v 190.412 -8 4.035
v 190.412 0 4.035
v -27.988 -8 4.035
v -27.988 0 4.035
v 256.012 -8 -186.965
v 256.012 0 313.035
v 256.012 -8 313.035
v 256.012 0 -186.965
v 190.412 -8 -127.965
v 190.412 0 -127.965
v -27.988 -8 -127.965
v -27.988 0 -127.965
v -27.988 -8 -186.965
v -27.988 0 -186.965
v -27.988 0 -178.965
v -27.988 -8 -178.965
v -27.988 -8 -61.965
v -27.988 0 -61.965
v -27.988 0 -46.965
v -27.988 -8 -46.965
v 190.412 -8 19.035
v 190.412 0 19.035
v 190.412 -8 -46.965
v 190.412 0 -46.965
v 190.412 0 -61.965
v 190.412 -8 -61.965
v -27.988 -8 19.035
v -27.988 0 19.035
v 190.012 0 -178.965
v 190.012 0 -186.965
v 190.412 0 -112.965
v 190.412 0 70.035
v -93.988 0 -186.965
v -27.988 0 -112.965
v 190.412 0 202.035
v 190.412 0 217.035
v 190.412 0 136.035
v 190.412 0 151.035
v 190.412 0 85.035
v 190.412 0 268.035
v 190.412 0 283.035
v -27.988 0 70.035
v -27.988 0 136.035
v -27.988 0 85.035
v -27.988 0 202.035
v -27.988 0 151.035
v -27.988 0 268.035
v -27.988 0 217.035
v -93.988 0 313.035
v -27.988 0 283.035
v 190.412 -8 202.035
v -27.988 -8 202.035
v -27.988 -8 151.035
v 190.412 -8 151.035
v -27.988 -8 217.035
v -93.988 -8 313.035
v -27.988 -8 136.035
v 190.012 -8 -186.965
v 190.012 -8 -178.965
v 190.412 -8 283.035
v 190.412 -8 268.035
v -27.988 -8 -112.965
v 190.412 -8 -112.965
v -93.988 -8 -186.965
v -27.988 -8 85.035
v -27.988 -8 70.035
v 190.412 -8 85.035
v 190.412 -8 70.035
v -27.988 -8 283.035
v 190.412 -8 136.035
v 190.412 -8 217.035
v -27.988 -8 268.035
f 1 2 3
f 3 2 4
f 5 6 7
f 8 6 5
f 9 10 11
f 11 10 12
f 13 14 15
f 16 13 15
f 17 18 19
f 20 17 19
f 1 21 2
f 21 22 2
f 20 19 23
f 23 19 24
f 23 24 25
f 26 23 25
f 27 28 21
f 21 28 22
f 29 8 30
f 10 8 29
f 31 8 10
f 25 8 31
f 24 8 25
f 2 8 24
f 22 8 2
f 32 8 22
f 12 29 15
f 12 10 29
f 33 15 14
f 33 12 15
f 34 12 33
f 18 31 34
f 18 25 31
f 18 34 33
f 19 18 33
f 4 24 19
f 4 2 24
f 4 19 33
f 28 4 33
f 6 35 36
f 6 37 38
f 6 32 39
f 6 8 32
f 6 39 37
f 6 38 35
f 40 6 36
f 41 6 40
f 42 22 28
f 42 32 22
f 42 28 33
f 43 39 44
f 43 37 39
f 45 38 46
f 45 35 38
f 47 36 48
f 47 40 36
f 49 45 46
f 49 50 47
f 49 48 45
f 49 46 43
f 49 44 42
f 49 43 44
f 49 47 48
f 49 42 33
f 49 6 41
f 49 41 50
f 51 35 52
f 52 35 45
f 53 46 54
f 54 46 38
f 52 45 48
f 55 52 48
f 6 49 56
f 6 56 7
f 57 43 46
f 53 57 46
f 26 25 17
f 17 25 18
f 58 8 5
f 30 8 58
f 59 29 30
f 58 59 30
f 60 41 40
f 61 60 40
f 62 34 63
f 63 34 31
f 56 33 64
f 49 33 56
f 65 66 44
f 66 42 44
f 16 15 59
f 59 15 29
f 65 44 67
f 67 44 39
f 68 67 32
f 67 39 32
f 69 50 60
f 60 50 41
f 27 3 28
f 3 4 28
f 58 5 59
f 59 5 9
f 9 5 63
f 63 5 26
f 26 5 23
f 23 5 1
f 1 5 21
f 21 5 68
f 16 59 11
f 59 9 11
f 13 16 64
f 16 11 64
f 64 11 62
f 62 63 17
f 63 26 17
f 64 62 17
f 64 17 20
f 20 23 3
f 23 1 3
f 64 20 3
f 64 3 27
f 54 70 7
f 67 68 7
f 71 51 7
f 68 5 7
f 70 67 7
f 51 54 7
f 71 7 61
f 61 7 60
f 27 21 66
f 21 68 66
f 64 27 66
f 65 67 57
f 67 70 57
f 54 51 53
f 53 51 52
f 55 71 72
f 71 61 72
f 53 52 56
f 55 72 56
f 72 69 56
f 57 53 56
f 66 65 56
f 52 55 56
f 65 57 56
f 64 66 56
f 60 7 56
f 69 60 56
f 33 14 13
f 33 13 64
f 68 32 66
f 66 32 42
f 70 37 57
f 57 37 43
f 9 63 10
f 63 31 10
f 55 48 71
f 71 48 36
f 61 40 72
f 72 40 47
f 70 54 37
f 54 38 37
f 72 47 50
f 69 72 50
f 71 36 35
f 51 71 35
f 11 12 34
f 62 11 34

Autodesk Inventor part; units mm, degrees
ref_plane "YZ Plane" through (0, 0, 0) normal (1, 0, 0) x (0, 1, 0)
ref_plane "XZ Plane" through (0, 0, 0) normal (0, 1, 0) x (-1, 0, 0)
ref_plane "XY Plane" through (0, 0, 0) normal (0, 0, 1) x (1, 0, 0)
sketch "Sketch1" plane through (0, 0, 0) normal (0, 1, 0) x (-1, 0, 0)
  line L0 (93.9879, 313.0349) -> (-256.0121, 313.0349)
  line L1 (-256.0121, 313.0349) -> (-256.0121, -186.9651)
  line L2 (-256.0121, -186.9651) -> (93.9879, -186.9651)
  line L3 (93.9879, -186.9651) -> (93.9879, 313.0349)
  line L4 (27.9879, 283.0349) -> (-190.4121, 283.0349)
  line L5 (-190.4121, 283.0349) -> (-190.4121, 268.0349)
  line L6 (-190.4121, 268.0349) -> (27.9879, 268.0349)
  line L7 (27.9879, 268.0349) -> (27.9879, 283.0349)
  line L8 (27.9879, 217.0349) -> (-190.4121, 217.0349)
  line L9 (-190.4121, 217.0349) -> (-190.4121, 202.0349)
  line L10 (-190.4121, 202.0349) -> (27.9879, 202.0349)
  line L11 (27.9879, 202.0349) -> (27.9879, 217.0349)
  line L12 (27.9879, 151.0349) -> (-190.4121, 151.0349)
  line L13 (-190.4121, 151.0349) -> (-190.4121, 136.0349)
  line L14 (-190.4121, 136.0349) -> (27.9879, 136.0349)
  line L15 (27.9879, 136.0349) -> (27.9879, 151.0349)
  line L16 (27.9879, 85.0349) -> (-190.4121, 85.0349)
  line L17 (-190.4121, 85.0349) -> (-190.4121, 70.0349)
  line L18 (-190.4121, 70.0349) -> (27.9879, 70.0349)
  line L19 (27.9879, 70.0349) -> (27.9879, 85.0349)
  line L20 (27.9879, 19.0349) -> (-190.4121, 19.0349)
  line L21 (-190.4121, 19.0349) -> (-190.4121, 4.0349)
  line L22 (-190.4121, 4.0349) -> (27.9879, 4.0349)
  line L23 (27.9879, 4.0349) -> (27.9879, 19.0349)
  line L24 (27.9879, -46.9651) -> (-190.4121, -46.9651)
  line L25 (-190.4121, -46.9651) -> (-190.4121, -61.9651)
  line L26 (-190.4121, -61.9651) -> (27.9879, -61.9651)
  line L27 (27.9879, -61.9651) -> (27.9879, -46.9651)
  line L28 (27.9879, -112.9651) -> (-190.4121, -112.9651)
  line L29 (-190.4121, -112.9651) -> (-190.4121, -127.9651)
  line L30 (-190.4121, -127.9651) -> (27.9879, -127.9651)
  line L31 (27.9879, -127.9651) -> (27.9879, -112.9651)
  line L32 (27.9879, -186.9651) -> (27.9879, -178.9651)
  line L33 (27.9879, -178.9651) -> (-190.0121, -178.9651)
  line L34 (-190.0121, -178.9651) -> (-190.0121, -186.9651)
  dimension "d0" = 500
  dimension "d1" = 350
  dimension "d11" = 15
  dimension "d13" = 30
  dimension "d22" = 66
  dimension "d27" = 8
  dimension "d28" = 218.4
extrude "Extrusion2" add sketch "Sketch1" against normal blind 8 contours L3 L2 L32 L33 L34 L1 L0 | L2 L34 L33 L32 | L11 L10 L9 L8 | L15 L14 L13 L12 | L19 L18 L17 L16 | L23 L22 L21 L20 | L27 L26 L25 L24 | L31 L30 L29 L28
extrude "Extrusion3" cut sketch "Sketch1" against normal up to surface (8 mm away) contours L11 L10 L9 L8 | L15 L14 L13 L12 | L19 L18 L17 L16 | L23 L22 L21 L20 | L27 L26 L25 L24 | L31 L30 L29 L28
extrude "Extrusion4" cut sketch "Sketch1" against normal up to surface (8 mm away) contours L2 L34 L33 L32
properties part number "ferrite_section" material "Acrylic"
